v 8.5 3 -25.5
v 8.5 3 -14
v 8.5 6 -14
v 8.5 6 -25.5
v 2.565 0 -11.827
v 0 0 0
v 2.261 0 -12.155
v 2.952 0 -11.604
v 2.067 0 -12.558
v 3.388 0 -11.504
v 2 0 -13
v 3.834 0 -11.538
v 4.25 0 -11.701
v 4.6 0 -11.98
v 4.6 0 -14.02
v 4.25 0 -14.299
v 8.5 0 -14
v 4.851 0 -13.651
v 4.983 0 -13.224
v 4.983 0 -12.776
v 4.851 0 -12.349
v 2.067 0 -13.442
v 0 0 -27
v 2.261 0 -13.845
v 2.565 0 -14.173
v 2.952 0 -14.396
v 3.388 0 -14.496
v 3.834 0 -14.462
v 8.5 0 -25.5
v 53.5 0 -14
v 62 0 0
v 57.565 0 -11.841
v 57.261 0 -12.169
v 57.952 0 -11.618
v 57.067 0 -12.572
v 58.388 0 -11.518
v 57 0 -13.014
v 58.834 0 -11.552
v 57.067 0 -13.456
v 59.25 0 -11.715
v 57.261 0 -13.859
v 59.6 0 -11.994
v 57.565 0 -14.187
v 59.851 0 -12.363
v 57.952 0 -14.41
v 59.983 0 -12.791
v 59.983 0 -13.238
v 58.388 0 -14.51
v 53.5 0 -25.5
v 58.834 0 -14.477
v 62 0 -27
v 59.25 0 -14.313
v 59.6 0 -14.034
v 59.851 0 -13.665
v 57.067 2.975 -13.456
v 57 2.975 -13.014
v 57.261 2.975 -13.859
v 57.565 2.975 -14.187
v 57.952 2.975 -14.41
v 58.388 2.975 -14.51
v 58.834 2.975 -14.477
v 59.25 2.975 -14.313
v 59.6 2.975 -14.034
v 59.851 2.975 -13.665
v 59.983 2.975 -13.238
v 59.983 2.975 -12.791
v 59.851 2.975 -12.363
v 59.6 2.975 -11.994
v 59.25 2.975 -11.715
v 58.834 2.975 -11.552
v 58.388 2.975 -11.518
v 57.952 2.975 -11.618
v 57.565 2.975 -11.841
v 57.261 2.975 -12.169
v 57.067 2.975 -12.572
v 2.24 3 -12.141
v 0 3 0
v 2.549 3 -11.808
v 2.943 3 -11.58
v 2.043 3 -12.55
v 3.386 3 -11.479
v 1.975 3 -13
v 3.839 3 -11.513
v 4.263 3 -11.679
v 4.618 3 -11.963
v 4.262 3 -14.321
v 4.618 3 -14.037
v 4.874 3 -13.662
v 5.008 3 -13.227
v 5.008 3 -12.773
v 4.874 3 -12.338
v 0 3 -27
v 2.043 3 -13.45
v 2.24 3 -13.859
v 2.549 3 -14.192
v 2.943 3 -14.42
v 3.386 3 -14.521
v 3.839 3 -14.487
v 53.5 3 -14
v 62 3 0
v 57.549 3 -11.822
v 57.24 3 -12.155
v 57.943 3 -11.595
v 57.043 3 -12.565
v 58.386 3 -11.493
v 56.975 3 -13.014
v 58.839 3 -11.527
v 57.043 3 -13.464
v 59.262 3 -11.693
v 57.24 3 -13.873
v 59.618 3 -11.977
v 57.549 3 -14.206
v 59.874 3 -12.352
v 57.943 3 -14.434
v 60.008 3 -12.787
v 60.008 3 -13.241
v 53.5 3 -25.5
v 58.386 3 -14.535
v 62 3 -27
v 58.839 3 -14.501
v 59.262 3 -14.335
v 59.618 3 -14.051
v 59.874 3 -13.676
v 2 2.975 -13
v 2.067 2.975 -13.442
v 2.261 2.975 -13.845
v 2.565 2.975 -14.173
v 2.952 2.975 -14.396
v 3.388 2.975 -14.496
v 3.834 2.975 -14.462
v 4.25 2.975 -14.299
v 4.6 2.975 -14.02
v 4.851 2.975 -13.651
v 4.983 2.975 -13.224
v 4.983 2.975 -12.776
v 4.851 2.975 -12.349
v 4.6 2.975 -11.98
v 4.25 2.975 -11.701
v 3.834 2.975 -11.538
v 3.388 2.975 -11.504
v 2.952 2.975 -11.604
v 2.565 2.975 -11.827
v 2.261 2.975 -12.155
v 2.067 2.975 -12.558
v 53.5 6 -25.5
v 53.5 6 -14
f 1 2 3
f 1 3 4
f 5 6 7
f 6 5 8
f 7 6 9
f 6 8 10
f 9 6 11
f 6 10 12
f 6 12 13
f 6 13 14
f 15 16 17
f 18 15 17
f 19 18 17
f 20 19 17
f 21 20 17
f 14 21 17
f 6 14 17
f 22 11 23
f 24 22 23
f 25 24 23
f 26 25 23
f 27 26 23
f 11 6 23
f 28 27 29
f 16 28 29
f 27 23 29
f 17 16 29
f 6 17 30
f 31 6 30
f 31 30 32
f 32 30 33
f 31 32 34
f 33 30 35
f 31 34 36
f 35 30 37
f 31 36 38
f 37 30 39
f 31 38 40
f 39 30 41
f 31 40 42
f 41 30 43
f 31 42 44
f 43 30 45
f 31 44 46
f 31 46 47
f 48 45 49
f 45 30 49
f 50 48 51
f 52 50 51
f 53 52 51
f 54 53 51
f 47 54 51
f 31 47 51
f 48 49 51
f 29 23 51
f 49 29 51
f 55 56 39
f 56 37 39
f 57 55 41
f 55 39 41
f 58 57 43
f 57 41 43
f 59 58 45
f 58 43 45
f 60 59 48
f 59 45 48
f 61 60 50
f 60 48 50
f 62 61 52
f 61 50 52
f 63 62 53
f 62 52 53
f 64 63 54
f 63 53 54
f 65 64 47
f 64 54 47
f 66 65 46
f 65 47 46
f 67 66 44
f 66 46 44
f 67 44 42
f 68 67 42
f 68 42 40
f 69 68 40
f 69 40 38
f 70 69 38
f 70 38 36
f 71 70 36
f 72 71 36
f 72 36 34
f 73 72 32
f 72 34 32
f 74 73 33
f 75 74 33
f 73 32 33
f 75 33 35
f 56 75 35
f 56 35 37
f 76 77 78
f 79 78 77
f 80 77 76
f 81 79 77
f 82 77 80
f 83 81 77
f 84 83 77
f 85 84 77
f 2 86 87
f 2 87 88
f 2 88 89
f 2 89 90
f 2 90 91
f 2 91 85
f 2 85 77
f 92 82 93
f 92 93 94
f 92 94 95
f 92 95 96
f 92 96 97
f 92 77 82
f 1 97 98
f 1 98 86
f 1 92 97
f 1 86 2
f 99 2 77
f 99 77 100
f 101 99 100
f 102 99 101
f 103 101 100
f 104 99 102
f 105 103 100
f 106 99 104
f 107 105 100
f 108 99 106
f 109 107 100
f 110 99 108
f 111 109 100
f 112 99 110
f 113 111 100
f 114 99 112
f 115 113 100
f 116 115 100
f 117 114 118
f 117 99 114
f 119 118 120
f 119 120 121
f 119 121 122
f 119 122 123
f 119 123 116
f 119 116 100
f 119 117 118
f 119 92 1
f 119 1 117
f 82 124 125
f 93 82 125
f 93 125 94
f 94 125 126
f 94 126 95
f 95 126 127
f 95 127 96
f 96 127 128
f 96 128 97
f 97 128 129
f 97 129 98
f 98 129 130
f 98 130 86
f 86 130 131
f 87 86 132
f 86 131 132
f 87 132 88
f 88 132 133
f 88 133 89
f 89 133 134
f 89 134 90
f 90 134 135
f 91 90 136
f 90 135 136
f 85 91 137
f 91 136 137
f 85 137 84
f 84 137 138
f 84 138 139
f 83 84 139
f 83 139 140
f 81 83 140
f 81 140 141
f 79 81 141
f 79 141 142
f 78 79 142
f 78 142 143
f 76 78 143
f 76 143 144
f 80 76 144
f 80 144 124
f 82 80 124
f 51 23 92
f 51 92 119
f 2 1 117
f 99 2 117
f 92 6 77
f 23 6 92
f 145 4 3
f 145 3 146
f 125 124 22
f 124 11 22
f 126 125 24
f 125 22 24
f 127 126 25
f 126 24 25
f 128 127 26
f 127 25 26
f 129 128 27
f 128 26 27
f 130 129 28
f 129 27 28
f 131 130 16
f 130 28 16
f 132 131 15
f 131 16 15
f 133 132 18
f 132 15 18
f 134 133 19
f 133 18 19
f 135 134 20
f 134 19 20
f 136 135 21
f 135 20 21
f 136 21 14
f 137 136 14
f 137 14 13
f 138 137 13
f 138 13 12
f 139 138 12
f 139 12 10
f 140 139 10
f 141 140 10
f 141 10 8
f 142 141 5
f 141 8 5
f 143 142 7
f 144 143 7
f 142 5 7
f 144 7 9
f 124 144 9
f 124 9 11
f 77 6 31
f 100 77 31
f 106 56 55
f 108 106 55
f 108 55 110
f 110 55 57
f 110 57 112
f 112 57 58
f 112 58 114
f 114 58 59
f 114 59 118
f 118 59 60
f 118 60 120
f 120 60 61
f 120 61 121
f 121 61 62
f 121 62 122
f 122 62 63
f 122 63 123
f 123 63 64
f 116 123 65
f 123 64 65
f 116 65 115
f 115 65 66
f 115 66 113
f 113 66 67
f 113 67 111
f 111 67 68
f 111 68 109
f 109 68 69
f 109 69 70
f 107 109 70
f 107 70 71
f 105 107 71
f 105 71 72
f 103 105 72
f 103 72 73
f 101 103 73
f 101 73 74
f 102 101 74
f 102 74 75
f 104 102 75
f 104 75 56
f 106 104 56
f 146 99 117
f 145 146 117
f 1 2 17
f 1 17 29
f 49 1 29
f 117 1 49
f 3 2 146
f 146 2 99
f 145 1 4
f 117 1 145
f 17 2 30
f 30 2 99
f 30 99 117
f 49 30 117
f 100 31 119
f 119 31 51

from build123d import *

# Parameters (mm, degrees)
SKETCH1_W                       = 62
SKETCH1_H                       = 27
BOSS_EXTRUDE1_DEPTH             = 3
F_3_0MM_DOWEL_HOLE1_D           = 3
F_3_0MM_DOWEL_HOLE1_CSINK_D     = 3.05
F_3_0MM_DOWEL_HOLE1_CSINK_ANGLE = 90
SKETCH5_W                       = 45
SKETCH5_H                       = 11.5
CUT_EXTRUDE1_DEPTH              = 68.690472003
SKETCH6_W                       = 45
SKETCH6_H                       = 11.5
BOSS_EXTRUDE2_DEPTH             = 3


with BuildPart() as part:
    # Sketch1 → Boss-Extrude1 (new body)
    with BuildSketch(Plane(origin=(0, 0, 0), x_dir=(1, 0, 0), z_dir=(0, 1, 0))):
        with Locations((31, 13.5)):
            Rectangle(SKETCH1_W, SKETCH1_H)
    extrude(amount=BOSS_EXTRUDE1_DEPTH)

    # Ø3.0mm Dowel Hole1 (through all)
    with Locations(Plane(origin=(0, 3, 0), x_dir=(1, 0, 0), z_dir=(0, 1, 0))):
        with Locations((3.5, 13), (58.499998178, 13.014156566)):
            CounterSinkHole(F_3_0MM_DOWEL_HOLE1_D / 2, F_3_0MM_DOWEL_HOLE1_CSINK_D / 2, counter_sink_angle=F_3_0MM_DOWEL_HOLE1_CSINK_ANGLE)

    # Sketch5 → Cut-Extrude1 (cut, through all)
    with BuildSketch(Plane(origin=(0, 3, 0), x_dir=(1, 0, 0), z_dir=(0, 1, 0))):
        with Locations((31, 19.75)):
            Rectangle(SKETCH5_W, SKETCH5_H)
    extrude(amount=-CUT_EXTRUDE1_DEPTH, mode=Mode.SUBTRACT)


with BuildPart() as body_2:
    # Sketch6 → Boss-Extrude2 (new body)
    with BuildSketch(Plane(origin=(0, 3, 0), x_dir=(1, 0, 0), z_dir=(0, 1, 0))):
        with Locations((31, 19.75)):
            Rectangle(SKETCH6_W, SKETCH6_H)
    extrude(amount=BOSS_EXTRUDE2_DEPTH)


solid = Compound([part.part, body_2.part])
